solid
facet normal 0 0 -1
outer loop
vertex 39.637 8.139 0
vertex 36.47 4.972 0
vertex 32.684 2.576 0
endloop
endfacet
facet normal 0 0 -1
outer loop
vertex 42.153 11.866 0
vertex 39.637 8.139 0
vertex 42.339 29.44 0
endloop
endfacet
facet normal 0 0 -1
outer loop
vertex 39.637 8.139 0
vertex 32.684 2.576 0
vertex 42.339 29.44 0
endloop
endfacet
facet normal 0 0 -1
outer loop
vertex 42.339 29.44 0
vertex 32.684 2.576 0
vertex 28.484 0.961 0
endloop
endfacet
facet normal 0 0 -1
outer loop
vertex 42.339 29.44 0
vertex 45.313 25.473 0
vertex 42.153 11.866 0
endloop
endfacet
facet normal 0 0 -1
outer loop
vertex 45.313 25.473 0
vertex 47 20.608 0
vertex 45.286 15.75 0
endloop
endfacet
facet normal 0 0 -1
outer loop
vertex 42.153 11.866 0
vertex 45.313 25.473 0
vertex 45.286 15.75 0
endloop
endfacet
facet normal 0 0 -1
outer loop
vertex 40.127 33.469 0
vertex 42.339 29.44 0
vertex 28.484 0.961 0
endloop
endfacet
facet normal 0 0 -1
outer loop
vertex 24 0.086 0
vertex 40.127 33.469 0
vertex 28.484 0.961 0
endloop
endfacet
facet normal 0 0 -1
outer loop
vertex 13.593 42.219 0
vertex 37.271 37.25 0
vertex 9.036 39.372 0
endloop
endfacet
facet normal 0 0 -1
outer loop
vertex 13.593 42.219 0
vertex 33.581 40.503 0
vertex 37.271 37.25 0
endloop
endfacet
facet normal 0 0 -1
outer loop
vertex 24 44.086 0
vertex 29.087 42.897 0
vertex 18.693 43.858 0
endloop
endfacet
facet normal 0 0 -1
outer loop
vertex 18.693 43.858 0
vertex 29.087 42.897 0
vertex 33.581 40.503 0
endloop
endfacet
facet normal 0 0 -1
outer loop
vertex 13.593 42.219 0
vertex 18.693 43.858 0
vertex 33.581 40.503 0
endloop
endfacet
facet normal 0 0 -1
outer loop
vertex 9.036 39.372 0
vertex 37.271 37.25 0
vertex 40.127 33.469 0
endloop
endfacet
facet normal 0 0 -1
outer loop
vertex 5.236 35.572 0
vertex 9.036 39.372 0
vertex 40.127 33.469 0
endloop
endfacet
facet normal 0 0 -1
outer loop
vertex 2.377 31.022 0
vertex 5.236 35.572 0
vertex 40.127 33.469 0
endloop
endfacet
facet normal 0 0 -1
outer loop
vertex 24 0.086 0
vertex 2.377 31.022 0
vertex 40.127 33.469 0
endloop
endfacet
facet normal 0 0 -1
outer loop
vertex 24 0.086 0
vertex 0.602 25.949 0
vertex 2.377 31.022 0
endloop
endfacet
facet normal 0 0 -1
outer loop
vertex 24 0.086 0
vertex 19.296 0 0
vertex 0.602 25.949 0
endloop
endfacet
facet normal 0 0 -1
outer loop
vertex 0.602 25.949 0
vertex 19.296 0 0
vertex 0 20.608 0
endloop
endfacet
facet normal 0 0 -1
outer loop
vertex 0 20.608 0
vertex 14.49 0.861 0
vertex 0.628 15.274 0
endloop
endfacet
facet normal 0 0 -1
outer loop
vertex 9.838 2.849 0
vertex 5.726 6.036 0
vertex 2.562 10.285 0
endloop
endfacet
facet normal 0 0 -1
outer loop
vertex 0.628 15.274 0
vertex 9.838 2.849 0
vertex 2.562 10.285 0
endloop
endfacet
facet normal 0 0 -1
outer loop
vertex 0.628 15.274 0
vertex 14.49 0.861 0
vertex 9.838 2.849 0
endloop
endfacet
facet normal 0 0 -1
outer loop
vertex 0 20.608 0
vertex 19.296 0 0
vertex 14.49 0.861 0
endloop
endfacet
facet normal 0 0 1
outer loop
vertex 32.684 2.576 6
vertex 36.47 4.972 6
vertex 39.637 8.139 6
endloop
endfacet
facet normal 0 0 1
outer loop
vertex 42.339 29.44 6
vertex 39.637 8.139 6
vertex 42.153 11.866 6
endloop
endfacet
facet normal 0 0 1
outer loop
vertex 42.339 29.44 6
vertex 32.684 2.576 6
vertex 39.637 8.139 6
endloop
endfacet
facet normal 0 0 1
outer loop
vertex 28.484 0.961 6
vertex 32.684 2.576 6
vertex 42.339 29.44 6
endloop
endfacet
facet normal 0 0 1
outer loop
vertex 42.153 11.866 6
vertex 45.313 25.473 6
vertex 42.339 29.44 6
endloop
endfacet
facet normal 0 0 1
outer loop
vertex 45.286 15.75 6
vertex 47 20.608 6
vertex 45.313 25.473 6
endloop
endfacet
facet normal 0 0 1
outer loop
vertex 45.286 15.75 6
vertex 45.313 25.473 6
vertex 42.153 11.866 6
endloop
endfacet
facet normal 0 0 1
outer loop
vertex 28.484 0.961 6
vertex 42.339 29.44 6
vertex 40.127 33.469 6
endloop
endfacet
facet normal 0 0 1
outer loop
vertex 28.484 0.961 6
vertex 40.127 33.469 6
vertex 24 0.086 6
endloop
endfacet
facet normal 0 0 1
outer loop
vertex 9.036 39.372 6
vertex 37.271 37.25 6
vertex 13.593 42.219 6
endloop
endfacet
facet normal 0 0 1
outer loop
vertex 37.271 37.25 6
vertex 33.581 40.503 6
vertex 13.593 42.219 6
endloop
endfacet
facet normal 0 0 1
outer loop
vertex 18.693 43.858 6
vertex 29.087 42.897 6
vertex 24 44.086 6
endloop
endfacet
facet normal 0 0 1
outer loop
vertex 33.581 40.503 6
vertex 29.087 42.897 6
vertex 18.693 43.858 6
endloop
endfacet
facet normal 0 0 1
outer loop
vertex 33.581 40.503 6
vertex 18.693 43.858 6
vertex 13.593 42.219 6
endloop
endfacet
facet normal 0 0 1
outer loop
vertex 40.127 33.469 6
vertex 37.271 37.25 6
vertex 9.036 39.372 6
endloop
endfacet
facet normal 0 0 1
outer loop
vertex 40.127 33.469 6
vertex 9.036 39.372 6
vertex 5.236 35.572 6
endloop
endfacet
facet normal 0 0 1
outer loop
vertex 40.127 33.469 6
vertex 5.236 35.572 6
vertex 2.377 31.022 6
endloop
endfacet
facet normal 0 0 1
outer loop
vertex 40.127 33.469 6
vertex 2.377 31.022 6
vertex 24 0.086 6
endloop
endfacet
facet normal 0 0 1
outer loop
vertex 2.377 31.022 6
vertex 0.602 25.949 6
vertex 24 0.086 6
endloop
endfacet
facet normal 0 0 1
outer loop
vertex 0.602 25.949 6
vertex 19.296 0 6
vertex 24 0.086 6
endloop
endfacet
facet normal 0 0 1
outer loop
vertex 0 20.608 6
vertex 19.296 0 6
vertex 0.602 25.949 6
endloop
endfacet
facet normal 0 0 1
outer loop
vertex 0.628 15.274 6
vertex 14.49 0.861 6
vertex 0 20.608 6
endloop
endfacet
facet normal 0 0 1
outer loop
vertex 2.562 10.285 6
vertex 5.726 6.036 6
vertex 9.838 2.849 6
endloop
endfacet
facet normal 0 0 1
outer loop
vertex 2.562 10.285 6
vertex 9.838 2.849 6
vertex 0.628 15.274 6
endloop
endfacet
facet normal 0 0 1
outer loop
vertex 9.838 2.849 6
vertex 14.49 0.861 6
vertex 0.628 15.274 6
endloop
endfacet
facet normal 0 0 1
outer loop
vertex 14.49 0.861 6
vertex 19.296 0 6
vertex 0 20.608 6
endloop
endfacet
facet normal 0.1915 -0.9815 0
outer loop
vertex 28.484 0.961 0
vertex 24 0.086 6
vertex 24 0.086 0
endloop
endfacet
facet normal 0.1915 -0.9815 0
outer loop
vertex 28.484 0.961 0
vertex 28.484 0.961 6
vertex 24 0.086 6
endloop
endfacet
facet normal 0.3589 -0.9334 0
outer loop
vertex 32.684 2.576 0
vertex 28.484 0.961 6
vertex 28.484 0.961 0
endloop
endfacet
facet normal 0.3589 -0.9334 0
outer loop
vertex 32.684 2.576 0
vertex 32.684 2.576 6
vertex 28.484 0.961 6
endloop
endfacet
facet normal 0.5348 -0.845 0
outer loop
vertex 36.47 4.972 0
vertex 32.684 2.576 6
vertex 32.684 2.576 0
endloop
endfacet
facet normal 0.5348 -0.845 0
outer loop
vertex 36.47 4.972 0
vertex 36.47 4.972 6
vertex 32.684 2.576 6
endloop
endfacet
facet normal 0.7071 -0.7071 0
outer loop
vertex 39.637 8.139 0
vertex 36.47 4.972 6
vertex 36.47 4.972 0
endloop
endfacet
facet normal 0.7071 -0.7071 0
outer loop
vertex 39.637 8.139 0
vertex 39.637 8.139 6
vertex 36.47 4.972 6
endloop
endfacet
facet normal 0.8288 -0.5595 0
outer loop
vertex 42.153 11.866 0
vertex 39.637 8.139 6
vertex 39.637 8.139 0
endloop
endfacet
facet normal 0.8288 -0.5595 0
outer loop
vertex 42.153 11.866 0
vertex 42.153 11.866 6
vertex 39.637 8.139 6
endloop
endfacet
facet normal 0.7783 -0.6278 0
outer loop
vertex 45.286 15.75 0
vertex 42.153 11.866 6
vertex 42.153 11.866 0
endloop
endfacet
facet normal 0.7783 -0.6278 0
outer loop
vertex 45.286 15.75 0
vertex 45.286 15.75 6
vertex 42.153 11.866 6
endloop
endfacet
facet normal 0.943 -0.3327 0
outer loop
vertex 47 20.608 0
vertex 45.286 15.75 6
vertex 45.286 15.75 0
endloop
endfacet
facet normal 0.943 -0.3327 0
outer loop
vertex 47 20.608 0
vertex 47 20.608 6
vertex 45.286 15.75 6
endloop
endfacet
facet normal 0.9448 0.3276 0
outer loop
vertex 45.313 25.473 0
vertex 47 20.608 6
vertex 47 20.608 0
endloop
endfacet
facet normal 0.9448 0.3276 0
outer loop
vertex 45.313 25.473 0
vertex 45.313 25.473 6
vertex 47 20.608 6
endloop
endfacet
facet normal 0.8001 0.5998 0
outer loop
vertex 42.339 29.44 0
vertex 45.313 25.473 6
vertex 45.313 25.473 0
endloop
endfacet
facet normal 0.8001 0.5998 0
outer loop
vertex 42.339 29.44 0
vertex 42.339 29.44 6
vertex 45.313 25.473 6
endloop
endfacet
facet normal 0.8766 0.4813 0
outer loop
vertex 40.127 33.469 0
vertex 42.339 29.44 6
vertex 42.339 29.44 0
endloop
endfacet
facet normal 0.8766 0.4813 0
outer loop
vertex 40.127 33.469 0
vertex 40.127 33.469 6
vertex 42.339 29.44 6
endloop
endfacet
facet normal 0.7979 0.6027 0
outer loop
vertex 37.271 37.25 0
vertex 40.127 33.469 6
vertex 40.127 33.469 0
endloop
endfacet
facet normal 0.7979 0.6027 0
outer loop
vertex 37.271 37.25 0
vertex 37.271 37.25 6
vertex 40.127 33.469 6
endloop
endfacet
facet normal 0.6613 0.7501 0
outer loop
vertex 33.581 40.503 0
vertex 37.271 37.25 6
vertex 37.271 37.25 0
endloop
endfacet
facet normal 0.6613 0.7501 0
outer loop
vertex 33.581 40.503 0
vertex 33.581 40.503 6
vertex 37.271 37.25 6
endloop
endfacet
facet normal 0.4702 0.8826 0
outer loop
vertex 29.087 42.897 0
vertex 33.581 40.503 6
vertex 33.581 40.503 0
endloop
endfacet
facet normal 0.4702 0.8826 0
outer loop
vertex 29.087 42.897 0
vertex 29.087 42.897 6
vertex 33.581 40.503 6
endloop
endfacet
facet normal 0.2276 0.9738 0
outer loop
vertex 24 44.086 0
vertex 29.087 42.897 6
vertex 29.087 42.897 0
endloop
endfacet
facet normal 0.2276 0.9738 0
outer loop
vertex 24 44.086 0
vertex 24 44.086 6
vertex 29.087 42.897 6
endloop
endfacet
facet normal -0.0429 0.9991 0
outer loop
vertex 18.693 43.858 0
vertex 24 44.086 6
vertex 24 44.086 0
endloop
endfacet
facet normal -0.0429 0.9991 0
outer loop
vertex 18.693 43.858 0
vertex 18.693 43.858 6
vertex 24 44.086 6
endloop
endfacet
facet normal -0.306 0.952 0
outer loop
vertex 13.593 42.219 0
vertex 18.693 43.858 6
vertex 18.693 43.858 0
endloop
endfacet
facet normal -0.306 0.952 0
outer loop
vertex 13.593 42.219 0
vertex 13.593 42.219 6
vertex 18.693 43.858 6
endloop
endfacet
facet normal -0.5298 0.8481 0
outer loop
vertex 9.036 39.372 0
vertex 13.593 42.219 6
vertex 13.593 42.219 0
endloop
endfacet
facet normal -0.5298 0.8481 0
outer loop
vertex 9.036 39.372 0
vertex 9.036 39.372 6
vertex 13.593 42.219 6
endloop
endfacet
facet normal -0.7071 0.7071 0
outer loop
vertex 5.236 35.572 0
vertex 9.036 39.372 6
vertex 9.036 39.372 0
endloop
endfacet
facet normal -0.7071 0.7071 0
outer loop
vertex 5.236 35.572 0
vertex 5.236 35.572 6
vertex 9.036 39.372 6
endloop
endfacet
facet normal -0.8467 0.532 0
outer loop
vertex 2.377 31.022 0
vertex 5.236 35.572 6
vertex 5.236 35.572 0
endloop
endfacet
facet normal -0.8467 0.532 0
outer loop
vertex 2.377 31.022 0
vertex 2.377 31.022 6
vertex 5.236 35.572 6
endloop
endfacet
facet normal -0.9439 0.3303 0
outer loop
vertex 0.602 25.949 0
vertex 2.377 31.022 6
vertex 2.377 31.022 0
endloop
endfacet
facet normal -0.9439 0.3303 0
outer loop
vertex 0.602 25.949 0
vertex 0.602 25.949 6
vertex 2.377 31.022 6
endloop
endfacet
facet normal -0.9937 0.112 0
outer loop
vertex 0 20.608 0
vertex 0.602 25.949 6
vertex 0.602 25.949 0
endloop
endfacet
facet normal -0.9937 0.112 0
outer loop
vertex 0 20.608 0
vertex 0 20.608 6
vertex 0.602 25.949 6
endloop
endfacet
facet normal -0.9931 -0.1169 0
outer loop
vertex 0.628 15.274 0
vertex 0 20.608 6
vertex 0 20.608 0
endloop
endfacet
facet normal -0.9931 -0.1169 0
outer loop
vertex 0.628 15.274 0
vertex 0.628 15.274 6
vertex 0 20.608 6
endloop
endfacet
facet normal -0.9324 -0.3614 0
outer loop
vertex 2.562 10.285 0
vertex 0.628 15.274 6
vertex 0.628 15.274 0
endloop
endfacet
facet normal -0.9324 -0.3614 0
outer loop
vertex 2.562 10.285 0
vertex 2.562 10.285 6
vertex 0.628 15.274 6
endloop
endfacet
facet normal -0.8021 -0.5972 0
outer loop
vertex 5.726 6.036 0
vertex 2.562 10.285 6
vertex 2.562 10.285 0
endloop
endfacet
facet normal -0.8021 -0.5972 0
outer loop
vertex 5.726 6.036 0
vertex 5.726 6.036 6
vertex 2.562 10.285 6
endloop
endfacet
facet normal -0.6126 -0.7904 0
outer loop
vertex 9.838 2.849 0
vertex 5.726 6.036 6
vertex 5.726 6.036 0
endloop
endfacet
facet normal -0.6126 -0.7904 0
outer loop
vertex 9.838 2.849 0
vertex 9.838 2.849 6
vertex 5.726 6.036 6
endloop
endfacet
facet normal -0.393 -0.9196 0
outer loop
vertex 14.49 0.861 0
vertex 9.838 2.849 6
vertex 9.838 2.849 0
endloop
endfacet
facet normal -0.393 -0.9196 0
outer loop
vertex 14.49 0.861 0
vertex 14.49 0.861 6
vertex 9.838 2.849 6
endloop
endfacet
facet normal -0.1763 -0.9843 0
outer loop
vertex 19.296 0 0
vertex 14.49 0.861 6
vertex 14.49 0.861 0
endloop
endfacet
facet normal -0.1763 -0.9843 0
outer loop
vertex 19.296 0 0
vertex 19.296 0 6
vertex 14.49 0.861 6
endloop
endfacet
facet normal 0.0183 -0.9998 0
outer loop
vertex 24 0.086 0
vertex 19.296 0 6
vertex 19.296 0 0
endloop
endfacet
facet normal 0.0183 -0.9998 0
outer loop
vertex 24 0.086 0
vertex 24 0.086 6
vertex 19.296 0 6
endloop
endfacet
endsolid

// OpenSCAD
$fn = 32;

// ----------------------------------------------------------------------
// Cam disc: base radius 20.0 mm, lift 4.0 mm, 28 profile points
// ----------------------------------------------------------------------

// --- parameters (mm) ---
profile_height = 6;       // extrusion height
profile_points = 28;      // points of the closed outline

profile = [[47, 20.608], [45.313, 25.473], [42.339, 29.44], [40.127, 33.469], [37.271, 37.25], [33.581, 40.503], [29.087, 42.897], [24, 44.086], [18.693, 43.858], [13.593, 42.219], [9.036, 39.372], [5.236, 35.572], [2.377, 31.022], [0.602, 25.949], [0, 20.608], [0.628, 15.274], [2.562, 10.285], [5.726, 6.036], [9.838, 2.849], [14.49, 0.861], [19.296, 0], [24, 0.086], [28.484, 0.961], [32.684, 2.576], [36.47, 4.972], [39.637, 8.139], [42.153, 11.866], [45.286, 15.75]];  // single closed polygon, 28 points, counter clockwise

// --- the one profile operation ---
linear_extrude(height = profile_height) polygon(points = profile);
